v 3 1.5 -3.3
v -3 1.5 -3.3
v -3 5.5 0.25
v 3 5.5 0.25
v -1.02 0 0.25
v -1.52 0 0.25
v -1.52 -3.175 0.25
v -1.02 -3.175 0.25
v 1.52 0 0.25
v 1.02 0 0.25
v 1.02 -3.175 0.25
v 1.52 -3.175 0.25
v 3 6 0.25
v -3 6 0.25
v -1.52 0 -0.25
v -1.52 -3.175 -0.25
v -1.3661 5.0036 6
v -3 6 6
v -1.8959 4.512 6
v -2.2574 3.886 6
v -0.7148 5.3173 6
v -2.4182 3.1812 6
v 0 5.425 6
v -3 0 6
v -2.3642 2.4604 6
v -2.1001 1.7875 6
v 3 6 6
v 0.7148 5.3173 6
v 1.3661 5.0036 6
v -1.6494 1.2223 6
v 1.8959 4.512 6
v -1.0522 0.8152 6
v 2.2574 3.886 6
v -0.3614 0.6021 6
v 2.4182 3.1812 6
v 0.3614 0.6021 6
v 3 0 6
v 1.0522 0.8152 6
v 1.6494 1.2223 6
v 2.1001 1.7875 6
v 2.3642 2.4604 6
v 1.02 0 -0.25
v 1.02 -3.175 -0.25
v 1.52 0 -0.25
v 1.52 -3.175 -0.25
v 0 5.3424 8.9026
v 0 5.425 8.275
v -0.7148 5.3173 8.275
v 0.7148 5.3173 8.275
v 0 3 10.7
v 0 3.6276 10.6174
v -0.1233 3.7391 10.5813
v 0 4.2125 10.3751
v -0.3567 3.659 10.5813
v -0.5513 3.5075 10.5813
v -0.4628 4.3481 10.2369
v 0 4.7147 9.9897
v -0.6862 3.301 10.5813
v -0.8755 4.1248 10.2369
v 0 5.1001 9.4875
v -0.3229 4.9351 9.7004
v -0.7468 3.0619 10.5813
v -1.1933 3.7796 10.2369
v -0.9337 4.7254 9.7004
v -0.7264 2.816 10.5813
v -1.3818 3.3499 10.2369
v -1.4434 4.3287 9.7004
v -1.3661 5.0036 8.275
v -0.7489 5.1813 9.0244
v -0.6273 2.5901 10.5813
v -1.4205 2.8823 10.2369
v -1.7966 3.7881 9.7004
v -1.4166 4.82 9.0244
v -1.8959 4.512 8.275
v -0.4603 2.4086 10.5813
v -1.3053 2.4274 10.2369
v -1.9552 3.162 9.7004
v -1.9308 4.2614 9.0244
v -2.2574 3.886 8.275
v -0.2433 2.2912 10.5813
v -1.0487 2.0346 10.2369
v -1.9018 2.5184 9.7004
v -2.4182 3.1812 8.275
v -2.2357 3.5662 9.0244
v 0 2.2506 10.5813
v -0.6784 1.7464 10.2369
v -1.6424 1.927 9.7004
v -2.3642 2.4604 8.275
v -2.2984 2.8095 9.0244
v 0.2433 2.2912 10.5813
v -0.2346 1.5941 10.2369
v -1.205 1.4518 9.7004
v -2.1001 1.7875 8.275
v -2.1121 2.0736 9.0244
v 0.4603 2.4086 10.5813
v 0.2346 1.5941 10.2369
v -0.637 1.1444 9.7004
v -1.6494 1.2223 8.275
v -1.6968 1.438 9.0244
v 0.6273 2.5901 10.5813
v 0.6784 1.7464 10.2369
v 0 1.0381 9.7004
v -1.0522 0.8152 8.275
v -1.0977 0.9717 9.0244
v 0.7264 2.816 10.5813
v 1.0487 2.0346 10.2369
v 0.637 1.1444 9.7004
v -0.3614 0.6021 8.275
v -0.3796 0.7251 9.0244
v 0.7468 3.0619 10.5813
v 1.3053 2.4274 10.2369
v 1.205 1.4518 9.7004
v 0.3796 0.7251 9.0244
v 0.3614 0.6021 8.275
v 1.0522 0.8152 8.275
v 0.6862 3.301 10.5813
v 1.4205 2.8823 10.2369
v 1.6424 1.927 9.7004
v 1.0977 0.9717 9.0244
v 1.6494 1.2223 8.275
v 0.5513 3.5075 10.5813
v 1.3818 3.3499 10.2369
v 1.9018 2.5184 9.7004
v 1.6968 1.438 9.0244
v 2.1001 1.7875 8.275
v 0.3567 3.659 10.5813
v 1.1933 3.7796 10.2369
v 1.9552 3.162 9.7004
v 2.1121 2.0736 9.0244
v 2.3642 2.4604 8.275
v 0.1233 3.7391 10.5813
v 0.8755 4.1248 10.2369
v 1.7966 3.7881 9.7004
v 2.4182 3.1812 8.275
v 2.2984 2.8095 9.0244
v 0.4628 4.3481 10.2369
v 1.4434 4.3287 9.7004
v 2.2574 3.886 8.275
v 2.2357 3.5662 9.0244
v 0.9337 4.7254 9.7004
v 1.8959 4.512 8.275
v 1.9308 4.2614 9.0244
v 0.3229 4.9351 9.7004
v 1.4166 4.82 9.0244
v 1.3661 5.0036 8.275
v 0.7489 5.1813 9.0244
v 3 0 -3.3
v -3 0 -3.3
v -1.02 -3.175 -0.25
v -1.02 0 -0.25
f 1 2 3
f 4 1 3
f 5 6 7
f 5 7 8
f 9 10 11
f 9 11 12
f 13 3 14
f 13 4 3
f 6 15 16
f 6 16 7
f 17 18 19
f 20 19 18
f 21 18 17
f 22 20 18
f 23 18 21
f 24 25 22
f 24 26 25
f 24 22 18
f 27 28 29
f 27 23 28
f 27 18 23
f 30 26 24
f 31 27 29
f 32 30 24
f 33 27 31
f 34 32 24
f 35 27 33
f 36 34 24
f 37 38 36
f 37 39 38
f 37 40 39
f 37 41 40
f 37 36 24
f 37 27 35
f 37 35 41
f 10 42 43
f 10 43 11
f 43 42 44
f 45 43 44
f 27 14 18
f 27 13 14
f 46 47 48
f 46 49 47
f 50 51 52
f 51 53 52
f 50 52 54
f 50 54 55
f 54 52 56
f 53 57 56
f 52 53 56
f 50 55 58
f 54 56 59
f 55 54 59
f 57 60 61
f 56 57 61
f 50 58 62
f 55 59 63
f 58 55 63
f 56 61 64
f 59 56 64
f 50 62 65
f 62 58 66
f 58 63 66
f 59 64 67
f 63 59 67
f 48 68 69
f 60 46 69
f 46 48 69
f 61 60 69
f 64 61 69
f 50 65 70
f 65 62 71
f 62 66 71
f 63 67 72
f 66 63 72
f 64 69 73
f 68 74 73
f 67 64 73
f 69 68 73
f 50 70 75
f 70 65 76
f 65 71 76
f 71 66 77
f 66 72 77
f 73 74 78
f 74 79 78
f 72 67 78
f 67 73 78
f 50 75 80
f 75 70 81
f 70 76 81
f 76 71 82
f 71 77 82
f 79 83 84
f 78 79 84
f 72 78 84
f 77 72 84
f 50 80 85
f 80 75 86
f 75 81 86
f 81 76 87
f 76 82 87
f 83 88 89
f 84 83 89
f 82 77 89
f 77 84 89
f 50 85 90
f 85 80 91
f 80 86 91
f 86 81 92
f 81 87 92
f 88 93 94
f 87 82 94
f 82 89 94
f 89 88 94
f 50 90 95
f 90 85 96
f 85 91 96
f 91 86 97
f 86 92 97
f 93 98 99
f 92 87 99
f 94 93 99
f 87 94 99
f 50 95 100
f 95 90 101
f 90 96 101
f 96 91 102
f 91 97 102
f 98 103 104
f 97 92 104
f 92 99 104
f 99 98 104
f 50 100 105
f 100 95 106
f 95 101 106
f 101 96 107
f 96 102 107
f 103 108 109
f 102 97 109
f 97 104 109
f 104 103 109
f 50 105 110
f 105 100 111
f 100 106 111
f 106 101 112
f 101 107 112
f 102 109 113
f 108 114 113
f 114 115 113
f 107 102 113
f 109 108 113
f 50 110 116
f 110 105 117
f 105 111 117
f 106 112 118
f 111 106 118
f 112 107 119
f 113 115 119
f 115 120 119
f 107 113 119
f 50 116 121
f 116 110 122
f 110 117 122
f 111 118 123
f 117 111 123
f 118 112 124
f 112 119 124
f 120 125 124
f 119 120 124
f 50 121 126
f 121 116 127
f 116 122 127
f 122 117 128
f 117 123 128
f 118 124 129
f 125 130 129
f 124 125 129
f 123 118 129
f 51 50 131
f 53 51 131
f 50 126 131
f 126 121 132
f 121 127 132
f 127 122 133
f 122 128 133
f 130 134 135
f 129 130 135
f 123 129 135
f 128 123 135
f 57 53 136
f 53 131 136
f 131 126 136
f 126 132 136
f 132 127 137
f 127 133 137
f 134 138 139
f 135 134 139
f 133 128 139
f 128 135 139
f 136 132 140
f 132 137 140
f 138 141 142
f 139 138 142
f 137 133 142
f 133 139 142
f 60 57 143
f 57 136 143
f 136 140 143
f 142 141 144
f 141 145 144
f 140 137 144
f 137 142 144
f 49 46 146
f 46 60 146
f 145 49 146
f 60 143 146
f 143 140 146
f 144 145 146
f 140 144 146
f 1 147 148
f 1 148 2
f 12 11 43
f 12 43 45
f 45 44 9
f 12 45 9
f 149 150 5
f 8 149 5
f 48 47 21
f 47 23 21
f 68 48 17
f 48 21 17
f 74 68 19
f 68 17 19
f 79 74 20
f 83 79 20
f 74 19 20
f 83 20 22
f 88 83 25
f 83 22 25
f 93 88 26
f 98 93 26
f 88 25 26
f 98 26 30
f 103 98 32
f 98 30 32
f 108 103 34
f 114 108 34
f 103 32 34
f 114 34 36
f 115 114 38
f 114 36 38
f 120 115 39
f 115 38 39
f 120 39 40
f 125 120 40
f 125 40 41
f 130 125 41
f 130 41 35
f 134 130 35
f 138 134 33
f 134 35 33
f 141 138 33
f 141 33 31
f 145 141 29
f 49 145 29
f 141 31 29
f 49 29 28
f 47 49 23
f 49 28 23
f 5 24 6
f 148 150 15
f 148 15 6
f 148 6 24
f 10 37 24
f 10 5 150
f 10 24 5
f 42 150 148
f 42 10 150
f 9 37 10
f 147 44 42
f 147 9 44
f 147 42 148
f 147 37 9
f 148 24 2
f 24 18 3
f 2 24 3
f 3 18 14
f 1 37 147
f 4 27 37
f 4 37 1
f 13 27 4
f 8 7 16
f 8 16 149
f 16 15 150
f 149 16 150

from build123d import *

# Parameters (mm, degrees)
BOSS_EXTRUDE1_DEPTH = 3
SKETCH3_W           = 0.5
SKETCH3_H           = 0.5
BOSS_EXTRUDE2_DEPTH = 3.175


with BuildPart() as part:
    # Sketch1 → Boss-Extrude1 (new body, symmetric)
    with BuildSketch(Plane(origin=(0, 0, 0), x_dir=(0, 0, -1), z_dir=(1, 0, 0))):
        Polygon((-6, 6), (-6, 0), (3.3, 0), (3.3, 1.5), (-0.25, 5.5), (-0.25, 6), align=None)
    extrude(amount=BOSS_EXTRUDE1_DEPTH, both=True)

    # Sketch2 → Revolve1 (revolve)
    with BuildSketch(Plane(origin=(0, 0, 0), x_dir=(0, 0, -1), z_dir=(1, 0, 0))):
        with BuildLine():
            Line((-6, 3), (-10.7, 3))
            ThreePointArc((-10.7, 3), (-9.989733944, 4.714733944), (-8.275, 5.425))
            Line((-8.275, 5.425), (-6, 5.425))
            Line((-6, 5.425), (-6, 3))
        make_face()
    revolve(axis=Axis((0, 3, 6), (0, 0, 1)))

    # Sketch3 → Boss-Extrude2 (add)
    with BuildSketch(Plane.XZ):
        with Locations((-1.27, 0)):
            Rectangle(SKETCH3_W, SKETCH3_H)
        with Locations((1.27, 0)):
            Rectangle(SKETCH3_W, SKETCH3_H)
    extrude(amount=BOSS_EXTRUDE2_DEPTH)


solid = part.part
